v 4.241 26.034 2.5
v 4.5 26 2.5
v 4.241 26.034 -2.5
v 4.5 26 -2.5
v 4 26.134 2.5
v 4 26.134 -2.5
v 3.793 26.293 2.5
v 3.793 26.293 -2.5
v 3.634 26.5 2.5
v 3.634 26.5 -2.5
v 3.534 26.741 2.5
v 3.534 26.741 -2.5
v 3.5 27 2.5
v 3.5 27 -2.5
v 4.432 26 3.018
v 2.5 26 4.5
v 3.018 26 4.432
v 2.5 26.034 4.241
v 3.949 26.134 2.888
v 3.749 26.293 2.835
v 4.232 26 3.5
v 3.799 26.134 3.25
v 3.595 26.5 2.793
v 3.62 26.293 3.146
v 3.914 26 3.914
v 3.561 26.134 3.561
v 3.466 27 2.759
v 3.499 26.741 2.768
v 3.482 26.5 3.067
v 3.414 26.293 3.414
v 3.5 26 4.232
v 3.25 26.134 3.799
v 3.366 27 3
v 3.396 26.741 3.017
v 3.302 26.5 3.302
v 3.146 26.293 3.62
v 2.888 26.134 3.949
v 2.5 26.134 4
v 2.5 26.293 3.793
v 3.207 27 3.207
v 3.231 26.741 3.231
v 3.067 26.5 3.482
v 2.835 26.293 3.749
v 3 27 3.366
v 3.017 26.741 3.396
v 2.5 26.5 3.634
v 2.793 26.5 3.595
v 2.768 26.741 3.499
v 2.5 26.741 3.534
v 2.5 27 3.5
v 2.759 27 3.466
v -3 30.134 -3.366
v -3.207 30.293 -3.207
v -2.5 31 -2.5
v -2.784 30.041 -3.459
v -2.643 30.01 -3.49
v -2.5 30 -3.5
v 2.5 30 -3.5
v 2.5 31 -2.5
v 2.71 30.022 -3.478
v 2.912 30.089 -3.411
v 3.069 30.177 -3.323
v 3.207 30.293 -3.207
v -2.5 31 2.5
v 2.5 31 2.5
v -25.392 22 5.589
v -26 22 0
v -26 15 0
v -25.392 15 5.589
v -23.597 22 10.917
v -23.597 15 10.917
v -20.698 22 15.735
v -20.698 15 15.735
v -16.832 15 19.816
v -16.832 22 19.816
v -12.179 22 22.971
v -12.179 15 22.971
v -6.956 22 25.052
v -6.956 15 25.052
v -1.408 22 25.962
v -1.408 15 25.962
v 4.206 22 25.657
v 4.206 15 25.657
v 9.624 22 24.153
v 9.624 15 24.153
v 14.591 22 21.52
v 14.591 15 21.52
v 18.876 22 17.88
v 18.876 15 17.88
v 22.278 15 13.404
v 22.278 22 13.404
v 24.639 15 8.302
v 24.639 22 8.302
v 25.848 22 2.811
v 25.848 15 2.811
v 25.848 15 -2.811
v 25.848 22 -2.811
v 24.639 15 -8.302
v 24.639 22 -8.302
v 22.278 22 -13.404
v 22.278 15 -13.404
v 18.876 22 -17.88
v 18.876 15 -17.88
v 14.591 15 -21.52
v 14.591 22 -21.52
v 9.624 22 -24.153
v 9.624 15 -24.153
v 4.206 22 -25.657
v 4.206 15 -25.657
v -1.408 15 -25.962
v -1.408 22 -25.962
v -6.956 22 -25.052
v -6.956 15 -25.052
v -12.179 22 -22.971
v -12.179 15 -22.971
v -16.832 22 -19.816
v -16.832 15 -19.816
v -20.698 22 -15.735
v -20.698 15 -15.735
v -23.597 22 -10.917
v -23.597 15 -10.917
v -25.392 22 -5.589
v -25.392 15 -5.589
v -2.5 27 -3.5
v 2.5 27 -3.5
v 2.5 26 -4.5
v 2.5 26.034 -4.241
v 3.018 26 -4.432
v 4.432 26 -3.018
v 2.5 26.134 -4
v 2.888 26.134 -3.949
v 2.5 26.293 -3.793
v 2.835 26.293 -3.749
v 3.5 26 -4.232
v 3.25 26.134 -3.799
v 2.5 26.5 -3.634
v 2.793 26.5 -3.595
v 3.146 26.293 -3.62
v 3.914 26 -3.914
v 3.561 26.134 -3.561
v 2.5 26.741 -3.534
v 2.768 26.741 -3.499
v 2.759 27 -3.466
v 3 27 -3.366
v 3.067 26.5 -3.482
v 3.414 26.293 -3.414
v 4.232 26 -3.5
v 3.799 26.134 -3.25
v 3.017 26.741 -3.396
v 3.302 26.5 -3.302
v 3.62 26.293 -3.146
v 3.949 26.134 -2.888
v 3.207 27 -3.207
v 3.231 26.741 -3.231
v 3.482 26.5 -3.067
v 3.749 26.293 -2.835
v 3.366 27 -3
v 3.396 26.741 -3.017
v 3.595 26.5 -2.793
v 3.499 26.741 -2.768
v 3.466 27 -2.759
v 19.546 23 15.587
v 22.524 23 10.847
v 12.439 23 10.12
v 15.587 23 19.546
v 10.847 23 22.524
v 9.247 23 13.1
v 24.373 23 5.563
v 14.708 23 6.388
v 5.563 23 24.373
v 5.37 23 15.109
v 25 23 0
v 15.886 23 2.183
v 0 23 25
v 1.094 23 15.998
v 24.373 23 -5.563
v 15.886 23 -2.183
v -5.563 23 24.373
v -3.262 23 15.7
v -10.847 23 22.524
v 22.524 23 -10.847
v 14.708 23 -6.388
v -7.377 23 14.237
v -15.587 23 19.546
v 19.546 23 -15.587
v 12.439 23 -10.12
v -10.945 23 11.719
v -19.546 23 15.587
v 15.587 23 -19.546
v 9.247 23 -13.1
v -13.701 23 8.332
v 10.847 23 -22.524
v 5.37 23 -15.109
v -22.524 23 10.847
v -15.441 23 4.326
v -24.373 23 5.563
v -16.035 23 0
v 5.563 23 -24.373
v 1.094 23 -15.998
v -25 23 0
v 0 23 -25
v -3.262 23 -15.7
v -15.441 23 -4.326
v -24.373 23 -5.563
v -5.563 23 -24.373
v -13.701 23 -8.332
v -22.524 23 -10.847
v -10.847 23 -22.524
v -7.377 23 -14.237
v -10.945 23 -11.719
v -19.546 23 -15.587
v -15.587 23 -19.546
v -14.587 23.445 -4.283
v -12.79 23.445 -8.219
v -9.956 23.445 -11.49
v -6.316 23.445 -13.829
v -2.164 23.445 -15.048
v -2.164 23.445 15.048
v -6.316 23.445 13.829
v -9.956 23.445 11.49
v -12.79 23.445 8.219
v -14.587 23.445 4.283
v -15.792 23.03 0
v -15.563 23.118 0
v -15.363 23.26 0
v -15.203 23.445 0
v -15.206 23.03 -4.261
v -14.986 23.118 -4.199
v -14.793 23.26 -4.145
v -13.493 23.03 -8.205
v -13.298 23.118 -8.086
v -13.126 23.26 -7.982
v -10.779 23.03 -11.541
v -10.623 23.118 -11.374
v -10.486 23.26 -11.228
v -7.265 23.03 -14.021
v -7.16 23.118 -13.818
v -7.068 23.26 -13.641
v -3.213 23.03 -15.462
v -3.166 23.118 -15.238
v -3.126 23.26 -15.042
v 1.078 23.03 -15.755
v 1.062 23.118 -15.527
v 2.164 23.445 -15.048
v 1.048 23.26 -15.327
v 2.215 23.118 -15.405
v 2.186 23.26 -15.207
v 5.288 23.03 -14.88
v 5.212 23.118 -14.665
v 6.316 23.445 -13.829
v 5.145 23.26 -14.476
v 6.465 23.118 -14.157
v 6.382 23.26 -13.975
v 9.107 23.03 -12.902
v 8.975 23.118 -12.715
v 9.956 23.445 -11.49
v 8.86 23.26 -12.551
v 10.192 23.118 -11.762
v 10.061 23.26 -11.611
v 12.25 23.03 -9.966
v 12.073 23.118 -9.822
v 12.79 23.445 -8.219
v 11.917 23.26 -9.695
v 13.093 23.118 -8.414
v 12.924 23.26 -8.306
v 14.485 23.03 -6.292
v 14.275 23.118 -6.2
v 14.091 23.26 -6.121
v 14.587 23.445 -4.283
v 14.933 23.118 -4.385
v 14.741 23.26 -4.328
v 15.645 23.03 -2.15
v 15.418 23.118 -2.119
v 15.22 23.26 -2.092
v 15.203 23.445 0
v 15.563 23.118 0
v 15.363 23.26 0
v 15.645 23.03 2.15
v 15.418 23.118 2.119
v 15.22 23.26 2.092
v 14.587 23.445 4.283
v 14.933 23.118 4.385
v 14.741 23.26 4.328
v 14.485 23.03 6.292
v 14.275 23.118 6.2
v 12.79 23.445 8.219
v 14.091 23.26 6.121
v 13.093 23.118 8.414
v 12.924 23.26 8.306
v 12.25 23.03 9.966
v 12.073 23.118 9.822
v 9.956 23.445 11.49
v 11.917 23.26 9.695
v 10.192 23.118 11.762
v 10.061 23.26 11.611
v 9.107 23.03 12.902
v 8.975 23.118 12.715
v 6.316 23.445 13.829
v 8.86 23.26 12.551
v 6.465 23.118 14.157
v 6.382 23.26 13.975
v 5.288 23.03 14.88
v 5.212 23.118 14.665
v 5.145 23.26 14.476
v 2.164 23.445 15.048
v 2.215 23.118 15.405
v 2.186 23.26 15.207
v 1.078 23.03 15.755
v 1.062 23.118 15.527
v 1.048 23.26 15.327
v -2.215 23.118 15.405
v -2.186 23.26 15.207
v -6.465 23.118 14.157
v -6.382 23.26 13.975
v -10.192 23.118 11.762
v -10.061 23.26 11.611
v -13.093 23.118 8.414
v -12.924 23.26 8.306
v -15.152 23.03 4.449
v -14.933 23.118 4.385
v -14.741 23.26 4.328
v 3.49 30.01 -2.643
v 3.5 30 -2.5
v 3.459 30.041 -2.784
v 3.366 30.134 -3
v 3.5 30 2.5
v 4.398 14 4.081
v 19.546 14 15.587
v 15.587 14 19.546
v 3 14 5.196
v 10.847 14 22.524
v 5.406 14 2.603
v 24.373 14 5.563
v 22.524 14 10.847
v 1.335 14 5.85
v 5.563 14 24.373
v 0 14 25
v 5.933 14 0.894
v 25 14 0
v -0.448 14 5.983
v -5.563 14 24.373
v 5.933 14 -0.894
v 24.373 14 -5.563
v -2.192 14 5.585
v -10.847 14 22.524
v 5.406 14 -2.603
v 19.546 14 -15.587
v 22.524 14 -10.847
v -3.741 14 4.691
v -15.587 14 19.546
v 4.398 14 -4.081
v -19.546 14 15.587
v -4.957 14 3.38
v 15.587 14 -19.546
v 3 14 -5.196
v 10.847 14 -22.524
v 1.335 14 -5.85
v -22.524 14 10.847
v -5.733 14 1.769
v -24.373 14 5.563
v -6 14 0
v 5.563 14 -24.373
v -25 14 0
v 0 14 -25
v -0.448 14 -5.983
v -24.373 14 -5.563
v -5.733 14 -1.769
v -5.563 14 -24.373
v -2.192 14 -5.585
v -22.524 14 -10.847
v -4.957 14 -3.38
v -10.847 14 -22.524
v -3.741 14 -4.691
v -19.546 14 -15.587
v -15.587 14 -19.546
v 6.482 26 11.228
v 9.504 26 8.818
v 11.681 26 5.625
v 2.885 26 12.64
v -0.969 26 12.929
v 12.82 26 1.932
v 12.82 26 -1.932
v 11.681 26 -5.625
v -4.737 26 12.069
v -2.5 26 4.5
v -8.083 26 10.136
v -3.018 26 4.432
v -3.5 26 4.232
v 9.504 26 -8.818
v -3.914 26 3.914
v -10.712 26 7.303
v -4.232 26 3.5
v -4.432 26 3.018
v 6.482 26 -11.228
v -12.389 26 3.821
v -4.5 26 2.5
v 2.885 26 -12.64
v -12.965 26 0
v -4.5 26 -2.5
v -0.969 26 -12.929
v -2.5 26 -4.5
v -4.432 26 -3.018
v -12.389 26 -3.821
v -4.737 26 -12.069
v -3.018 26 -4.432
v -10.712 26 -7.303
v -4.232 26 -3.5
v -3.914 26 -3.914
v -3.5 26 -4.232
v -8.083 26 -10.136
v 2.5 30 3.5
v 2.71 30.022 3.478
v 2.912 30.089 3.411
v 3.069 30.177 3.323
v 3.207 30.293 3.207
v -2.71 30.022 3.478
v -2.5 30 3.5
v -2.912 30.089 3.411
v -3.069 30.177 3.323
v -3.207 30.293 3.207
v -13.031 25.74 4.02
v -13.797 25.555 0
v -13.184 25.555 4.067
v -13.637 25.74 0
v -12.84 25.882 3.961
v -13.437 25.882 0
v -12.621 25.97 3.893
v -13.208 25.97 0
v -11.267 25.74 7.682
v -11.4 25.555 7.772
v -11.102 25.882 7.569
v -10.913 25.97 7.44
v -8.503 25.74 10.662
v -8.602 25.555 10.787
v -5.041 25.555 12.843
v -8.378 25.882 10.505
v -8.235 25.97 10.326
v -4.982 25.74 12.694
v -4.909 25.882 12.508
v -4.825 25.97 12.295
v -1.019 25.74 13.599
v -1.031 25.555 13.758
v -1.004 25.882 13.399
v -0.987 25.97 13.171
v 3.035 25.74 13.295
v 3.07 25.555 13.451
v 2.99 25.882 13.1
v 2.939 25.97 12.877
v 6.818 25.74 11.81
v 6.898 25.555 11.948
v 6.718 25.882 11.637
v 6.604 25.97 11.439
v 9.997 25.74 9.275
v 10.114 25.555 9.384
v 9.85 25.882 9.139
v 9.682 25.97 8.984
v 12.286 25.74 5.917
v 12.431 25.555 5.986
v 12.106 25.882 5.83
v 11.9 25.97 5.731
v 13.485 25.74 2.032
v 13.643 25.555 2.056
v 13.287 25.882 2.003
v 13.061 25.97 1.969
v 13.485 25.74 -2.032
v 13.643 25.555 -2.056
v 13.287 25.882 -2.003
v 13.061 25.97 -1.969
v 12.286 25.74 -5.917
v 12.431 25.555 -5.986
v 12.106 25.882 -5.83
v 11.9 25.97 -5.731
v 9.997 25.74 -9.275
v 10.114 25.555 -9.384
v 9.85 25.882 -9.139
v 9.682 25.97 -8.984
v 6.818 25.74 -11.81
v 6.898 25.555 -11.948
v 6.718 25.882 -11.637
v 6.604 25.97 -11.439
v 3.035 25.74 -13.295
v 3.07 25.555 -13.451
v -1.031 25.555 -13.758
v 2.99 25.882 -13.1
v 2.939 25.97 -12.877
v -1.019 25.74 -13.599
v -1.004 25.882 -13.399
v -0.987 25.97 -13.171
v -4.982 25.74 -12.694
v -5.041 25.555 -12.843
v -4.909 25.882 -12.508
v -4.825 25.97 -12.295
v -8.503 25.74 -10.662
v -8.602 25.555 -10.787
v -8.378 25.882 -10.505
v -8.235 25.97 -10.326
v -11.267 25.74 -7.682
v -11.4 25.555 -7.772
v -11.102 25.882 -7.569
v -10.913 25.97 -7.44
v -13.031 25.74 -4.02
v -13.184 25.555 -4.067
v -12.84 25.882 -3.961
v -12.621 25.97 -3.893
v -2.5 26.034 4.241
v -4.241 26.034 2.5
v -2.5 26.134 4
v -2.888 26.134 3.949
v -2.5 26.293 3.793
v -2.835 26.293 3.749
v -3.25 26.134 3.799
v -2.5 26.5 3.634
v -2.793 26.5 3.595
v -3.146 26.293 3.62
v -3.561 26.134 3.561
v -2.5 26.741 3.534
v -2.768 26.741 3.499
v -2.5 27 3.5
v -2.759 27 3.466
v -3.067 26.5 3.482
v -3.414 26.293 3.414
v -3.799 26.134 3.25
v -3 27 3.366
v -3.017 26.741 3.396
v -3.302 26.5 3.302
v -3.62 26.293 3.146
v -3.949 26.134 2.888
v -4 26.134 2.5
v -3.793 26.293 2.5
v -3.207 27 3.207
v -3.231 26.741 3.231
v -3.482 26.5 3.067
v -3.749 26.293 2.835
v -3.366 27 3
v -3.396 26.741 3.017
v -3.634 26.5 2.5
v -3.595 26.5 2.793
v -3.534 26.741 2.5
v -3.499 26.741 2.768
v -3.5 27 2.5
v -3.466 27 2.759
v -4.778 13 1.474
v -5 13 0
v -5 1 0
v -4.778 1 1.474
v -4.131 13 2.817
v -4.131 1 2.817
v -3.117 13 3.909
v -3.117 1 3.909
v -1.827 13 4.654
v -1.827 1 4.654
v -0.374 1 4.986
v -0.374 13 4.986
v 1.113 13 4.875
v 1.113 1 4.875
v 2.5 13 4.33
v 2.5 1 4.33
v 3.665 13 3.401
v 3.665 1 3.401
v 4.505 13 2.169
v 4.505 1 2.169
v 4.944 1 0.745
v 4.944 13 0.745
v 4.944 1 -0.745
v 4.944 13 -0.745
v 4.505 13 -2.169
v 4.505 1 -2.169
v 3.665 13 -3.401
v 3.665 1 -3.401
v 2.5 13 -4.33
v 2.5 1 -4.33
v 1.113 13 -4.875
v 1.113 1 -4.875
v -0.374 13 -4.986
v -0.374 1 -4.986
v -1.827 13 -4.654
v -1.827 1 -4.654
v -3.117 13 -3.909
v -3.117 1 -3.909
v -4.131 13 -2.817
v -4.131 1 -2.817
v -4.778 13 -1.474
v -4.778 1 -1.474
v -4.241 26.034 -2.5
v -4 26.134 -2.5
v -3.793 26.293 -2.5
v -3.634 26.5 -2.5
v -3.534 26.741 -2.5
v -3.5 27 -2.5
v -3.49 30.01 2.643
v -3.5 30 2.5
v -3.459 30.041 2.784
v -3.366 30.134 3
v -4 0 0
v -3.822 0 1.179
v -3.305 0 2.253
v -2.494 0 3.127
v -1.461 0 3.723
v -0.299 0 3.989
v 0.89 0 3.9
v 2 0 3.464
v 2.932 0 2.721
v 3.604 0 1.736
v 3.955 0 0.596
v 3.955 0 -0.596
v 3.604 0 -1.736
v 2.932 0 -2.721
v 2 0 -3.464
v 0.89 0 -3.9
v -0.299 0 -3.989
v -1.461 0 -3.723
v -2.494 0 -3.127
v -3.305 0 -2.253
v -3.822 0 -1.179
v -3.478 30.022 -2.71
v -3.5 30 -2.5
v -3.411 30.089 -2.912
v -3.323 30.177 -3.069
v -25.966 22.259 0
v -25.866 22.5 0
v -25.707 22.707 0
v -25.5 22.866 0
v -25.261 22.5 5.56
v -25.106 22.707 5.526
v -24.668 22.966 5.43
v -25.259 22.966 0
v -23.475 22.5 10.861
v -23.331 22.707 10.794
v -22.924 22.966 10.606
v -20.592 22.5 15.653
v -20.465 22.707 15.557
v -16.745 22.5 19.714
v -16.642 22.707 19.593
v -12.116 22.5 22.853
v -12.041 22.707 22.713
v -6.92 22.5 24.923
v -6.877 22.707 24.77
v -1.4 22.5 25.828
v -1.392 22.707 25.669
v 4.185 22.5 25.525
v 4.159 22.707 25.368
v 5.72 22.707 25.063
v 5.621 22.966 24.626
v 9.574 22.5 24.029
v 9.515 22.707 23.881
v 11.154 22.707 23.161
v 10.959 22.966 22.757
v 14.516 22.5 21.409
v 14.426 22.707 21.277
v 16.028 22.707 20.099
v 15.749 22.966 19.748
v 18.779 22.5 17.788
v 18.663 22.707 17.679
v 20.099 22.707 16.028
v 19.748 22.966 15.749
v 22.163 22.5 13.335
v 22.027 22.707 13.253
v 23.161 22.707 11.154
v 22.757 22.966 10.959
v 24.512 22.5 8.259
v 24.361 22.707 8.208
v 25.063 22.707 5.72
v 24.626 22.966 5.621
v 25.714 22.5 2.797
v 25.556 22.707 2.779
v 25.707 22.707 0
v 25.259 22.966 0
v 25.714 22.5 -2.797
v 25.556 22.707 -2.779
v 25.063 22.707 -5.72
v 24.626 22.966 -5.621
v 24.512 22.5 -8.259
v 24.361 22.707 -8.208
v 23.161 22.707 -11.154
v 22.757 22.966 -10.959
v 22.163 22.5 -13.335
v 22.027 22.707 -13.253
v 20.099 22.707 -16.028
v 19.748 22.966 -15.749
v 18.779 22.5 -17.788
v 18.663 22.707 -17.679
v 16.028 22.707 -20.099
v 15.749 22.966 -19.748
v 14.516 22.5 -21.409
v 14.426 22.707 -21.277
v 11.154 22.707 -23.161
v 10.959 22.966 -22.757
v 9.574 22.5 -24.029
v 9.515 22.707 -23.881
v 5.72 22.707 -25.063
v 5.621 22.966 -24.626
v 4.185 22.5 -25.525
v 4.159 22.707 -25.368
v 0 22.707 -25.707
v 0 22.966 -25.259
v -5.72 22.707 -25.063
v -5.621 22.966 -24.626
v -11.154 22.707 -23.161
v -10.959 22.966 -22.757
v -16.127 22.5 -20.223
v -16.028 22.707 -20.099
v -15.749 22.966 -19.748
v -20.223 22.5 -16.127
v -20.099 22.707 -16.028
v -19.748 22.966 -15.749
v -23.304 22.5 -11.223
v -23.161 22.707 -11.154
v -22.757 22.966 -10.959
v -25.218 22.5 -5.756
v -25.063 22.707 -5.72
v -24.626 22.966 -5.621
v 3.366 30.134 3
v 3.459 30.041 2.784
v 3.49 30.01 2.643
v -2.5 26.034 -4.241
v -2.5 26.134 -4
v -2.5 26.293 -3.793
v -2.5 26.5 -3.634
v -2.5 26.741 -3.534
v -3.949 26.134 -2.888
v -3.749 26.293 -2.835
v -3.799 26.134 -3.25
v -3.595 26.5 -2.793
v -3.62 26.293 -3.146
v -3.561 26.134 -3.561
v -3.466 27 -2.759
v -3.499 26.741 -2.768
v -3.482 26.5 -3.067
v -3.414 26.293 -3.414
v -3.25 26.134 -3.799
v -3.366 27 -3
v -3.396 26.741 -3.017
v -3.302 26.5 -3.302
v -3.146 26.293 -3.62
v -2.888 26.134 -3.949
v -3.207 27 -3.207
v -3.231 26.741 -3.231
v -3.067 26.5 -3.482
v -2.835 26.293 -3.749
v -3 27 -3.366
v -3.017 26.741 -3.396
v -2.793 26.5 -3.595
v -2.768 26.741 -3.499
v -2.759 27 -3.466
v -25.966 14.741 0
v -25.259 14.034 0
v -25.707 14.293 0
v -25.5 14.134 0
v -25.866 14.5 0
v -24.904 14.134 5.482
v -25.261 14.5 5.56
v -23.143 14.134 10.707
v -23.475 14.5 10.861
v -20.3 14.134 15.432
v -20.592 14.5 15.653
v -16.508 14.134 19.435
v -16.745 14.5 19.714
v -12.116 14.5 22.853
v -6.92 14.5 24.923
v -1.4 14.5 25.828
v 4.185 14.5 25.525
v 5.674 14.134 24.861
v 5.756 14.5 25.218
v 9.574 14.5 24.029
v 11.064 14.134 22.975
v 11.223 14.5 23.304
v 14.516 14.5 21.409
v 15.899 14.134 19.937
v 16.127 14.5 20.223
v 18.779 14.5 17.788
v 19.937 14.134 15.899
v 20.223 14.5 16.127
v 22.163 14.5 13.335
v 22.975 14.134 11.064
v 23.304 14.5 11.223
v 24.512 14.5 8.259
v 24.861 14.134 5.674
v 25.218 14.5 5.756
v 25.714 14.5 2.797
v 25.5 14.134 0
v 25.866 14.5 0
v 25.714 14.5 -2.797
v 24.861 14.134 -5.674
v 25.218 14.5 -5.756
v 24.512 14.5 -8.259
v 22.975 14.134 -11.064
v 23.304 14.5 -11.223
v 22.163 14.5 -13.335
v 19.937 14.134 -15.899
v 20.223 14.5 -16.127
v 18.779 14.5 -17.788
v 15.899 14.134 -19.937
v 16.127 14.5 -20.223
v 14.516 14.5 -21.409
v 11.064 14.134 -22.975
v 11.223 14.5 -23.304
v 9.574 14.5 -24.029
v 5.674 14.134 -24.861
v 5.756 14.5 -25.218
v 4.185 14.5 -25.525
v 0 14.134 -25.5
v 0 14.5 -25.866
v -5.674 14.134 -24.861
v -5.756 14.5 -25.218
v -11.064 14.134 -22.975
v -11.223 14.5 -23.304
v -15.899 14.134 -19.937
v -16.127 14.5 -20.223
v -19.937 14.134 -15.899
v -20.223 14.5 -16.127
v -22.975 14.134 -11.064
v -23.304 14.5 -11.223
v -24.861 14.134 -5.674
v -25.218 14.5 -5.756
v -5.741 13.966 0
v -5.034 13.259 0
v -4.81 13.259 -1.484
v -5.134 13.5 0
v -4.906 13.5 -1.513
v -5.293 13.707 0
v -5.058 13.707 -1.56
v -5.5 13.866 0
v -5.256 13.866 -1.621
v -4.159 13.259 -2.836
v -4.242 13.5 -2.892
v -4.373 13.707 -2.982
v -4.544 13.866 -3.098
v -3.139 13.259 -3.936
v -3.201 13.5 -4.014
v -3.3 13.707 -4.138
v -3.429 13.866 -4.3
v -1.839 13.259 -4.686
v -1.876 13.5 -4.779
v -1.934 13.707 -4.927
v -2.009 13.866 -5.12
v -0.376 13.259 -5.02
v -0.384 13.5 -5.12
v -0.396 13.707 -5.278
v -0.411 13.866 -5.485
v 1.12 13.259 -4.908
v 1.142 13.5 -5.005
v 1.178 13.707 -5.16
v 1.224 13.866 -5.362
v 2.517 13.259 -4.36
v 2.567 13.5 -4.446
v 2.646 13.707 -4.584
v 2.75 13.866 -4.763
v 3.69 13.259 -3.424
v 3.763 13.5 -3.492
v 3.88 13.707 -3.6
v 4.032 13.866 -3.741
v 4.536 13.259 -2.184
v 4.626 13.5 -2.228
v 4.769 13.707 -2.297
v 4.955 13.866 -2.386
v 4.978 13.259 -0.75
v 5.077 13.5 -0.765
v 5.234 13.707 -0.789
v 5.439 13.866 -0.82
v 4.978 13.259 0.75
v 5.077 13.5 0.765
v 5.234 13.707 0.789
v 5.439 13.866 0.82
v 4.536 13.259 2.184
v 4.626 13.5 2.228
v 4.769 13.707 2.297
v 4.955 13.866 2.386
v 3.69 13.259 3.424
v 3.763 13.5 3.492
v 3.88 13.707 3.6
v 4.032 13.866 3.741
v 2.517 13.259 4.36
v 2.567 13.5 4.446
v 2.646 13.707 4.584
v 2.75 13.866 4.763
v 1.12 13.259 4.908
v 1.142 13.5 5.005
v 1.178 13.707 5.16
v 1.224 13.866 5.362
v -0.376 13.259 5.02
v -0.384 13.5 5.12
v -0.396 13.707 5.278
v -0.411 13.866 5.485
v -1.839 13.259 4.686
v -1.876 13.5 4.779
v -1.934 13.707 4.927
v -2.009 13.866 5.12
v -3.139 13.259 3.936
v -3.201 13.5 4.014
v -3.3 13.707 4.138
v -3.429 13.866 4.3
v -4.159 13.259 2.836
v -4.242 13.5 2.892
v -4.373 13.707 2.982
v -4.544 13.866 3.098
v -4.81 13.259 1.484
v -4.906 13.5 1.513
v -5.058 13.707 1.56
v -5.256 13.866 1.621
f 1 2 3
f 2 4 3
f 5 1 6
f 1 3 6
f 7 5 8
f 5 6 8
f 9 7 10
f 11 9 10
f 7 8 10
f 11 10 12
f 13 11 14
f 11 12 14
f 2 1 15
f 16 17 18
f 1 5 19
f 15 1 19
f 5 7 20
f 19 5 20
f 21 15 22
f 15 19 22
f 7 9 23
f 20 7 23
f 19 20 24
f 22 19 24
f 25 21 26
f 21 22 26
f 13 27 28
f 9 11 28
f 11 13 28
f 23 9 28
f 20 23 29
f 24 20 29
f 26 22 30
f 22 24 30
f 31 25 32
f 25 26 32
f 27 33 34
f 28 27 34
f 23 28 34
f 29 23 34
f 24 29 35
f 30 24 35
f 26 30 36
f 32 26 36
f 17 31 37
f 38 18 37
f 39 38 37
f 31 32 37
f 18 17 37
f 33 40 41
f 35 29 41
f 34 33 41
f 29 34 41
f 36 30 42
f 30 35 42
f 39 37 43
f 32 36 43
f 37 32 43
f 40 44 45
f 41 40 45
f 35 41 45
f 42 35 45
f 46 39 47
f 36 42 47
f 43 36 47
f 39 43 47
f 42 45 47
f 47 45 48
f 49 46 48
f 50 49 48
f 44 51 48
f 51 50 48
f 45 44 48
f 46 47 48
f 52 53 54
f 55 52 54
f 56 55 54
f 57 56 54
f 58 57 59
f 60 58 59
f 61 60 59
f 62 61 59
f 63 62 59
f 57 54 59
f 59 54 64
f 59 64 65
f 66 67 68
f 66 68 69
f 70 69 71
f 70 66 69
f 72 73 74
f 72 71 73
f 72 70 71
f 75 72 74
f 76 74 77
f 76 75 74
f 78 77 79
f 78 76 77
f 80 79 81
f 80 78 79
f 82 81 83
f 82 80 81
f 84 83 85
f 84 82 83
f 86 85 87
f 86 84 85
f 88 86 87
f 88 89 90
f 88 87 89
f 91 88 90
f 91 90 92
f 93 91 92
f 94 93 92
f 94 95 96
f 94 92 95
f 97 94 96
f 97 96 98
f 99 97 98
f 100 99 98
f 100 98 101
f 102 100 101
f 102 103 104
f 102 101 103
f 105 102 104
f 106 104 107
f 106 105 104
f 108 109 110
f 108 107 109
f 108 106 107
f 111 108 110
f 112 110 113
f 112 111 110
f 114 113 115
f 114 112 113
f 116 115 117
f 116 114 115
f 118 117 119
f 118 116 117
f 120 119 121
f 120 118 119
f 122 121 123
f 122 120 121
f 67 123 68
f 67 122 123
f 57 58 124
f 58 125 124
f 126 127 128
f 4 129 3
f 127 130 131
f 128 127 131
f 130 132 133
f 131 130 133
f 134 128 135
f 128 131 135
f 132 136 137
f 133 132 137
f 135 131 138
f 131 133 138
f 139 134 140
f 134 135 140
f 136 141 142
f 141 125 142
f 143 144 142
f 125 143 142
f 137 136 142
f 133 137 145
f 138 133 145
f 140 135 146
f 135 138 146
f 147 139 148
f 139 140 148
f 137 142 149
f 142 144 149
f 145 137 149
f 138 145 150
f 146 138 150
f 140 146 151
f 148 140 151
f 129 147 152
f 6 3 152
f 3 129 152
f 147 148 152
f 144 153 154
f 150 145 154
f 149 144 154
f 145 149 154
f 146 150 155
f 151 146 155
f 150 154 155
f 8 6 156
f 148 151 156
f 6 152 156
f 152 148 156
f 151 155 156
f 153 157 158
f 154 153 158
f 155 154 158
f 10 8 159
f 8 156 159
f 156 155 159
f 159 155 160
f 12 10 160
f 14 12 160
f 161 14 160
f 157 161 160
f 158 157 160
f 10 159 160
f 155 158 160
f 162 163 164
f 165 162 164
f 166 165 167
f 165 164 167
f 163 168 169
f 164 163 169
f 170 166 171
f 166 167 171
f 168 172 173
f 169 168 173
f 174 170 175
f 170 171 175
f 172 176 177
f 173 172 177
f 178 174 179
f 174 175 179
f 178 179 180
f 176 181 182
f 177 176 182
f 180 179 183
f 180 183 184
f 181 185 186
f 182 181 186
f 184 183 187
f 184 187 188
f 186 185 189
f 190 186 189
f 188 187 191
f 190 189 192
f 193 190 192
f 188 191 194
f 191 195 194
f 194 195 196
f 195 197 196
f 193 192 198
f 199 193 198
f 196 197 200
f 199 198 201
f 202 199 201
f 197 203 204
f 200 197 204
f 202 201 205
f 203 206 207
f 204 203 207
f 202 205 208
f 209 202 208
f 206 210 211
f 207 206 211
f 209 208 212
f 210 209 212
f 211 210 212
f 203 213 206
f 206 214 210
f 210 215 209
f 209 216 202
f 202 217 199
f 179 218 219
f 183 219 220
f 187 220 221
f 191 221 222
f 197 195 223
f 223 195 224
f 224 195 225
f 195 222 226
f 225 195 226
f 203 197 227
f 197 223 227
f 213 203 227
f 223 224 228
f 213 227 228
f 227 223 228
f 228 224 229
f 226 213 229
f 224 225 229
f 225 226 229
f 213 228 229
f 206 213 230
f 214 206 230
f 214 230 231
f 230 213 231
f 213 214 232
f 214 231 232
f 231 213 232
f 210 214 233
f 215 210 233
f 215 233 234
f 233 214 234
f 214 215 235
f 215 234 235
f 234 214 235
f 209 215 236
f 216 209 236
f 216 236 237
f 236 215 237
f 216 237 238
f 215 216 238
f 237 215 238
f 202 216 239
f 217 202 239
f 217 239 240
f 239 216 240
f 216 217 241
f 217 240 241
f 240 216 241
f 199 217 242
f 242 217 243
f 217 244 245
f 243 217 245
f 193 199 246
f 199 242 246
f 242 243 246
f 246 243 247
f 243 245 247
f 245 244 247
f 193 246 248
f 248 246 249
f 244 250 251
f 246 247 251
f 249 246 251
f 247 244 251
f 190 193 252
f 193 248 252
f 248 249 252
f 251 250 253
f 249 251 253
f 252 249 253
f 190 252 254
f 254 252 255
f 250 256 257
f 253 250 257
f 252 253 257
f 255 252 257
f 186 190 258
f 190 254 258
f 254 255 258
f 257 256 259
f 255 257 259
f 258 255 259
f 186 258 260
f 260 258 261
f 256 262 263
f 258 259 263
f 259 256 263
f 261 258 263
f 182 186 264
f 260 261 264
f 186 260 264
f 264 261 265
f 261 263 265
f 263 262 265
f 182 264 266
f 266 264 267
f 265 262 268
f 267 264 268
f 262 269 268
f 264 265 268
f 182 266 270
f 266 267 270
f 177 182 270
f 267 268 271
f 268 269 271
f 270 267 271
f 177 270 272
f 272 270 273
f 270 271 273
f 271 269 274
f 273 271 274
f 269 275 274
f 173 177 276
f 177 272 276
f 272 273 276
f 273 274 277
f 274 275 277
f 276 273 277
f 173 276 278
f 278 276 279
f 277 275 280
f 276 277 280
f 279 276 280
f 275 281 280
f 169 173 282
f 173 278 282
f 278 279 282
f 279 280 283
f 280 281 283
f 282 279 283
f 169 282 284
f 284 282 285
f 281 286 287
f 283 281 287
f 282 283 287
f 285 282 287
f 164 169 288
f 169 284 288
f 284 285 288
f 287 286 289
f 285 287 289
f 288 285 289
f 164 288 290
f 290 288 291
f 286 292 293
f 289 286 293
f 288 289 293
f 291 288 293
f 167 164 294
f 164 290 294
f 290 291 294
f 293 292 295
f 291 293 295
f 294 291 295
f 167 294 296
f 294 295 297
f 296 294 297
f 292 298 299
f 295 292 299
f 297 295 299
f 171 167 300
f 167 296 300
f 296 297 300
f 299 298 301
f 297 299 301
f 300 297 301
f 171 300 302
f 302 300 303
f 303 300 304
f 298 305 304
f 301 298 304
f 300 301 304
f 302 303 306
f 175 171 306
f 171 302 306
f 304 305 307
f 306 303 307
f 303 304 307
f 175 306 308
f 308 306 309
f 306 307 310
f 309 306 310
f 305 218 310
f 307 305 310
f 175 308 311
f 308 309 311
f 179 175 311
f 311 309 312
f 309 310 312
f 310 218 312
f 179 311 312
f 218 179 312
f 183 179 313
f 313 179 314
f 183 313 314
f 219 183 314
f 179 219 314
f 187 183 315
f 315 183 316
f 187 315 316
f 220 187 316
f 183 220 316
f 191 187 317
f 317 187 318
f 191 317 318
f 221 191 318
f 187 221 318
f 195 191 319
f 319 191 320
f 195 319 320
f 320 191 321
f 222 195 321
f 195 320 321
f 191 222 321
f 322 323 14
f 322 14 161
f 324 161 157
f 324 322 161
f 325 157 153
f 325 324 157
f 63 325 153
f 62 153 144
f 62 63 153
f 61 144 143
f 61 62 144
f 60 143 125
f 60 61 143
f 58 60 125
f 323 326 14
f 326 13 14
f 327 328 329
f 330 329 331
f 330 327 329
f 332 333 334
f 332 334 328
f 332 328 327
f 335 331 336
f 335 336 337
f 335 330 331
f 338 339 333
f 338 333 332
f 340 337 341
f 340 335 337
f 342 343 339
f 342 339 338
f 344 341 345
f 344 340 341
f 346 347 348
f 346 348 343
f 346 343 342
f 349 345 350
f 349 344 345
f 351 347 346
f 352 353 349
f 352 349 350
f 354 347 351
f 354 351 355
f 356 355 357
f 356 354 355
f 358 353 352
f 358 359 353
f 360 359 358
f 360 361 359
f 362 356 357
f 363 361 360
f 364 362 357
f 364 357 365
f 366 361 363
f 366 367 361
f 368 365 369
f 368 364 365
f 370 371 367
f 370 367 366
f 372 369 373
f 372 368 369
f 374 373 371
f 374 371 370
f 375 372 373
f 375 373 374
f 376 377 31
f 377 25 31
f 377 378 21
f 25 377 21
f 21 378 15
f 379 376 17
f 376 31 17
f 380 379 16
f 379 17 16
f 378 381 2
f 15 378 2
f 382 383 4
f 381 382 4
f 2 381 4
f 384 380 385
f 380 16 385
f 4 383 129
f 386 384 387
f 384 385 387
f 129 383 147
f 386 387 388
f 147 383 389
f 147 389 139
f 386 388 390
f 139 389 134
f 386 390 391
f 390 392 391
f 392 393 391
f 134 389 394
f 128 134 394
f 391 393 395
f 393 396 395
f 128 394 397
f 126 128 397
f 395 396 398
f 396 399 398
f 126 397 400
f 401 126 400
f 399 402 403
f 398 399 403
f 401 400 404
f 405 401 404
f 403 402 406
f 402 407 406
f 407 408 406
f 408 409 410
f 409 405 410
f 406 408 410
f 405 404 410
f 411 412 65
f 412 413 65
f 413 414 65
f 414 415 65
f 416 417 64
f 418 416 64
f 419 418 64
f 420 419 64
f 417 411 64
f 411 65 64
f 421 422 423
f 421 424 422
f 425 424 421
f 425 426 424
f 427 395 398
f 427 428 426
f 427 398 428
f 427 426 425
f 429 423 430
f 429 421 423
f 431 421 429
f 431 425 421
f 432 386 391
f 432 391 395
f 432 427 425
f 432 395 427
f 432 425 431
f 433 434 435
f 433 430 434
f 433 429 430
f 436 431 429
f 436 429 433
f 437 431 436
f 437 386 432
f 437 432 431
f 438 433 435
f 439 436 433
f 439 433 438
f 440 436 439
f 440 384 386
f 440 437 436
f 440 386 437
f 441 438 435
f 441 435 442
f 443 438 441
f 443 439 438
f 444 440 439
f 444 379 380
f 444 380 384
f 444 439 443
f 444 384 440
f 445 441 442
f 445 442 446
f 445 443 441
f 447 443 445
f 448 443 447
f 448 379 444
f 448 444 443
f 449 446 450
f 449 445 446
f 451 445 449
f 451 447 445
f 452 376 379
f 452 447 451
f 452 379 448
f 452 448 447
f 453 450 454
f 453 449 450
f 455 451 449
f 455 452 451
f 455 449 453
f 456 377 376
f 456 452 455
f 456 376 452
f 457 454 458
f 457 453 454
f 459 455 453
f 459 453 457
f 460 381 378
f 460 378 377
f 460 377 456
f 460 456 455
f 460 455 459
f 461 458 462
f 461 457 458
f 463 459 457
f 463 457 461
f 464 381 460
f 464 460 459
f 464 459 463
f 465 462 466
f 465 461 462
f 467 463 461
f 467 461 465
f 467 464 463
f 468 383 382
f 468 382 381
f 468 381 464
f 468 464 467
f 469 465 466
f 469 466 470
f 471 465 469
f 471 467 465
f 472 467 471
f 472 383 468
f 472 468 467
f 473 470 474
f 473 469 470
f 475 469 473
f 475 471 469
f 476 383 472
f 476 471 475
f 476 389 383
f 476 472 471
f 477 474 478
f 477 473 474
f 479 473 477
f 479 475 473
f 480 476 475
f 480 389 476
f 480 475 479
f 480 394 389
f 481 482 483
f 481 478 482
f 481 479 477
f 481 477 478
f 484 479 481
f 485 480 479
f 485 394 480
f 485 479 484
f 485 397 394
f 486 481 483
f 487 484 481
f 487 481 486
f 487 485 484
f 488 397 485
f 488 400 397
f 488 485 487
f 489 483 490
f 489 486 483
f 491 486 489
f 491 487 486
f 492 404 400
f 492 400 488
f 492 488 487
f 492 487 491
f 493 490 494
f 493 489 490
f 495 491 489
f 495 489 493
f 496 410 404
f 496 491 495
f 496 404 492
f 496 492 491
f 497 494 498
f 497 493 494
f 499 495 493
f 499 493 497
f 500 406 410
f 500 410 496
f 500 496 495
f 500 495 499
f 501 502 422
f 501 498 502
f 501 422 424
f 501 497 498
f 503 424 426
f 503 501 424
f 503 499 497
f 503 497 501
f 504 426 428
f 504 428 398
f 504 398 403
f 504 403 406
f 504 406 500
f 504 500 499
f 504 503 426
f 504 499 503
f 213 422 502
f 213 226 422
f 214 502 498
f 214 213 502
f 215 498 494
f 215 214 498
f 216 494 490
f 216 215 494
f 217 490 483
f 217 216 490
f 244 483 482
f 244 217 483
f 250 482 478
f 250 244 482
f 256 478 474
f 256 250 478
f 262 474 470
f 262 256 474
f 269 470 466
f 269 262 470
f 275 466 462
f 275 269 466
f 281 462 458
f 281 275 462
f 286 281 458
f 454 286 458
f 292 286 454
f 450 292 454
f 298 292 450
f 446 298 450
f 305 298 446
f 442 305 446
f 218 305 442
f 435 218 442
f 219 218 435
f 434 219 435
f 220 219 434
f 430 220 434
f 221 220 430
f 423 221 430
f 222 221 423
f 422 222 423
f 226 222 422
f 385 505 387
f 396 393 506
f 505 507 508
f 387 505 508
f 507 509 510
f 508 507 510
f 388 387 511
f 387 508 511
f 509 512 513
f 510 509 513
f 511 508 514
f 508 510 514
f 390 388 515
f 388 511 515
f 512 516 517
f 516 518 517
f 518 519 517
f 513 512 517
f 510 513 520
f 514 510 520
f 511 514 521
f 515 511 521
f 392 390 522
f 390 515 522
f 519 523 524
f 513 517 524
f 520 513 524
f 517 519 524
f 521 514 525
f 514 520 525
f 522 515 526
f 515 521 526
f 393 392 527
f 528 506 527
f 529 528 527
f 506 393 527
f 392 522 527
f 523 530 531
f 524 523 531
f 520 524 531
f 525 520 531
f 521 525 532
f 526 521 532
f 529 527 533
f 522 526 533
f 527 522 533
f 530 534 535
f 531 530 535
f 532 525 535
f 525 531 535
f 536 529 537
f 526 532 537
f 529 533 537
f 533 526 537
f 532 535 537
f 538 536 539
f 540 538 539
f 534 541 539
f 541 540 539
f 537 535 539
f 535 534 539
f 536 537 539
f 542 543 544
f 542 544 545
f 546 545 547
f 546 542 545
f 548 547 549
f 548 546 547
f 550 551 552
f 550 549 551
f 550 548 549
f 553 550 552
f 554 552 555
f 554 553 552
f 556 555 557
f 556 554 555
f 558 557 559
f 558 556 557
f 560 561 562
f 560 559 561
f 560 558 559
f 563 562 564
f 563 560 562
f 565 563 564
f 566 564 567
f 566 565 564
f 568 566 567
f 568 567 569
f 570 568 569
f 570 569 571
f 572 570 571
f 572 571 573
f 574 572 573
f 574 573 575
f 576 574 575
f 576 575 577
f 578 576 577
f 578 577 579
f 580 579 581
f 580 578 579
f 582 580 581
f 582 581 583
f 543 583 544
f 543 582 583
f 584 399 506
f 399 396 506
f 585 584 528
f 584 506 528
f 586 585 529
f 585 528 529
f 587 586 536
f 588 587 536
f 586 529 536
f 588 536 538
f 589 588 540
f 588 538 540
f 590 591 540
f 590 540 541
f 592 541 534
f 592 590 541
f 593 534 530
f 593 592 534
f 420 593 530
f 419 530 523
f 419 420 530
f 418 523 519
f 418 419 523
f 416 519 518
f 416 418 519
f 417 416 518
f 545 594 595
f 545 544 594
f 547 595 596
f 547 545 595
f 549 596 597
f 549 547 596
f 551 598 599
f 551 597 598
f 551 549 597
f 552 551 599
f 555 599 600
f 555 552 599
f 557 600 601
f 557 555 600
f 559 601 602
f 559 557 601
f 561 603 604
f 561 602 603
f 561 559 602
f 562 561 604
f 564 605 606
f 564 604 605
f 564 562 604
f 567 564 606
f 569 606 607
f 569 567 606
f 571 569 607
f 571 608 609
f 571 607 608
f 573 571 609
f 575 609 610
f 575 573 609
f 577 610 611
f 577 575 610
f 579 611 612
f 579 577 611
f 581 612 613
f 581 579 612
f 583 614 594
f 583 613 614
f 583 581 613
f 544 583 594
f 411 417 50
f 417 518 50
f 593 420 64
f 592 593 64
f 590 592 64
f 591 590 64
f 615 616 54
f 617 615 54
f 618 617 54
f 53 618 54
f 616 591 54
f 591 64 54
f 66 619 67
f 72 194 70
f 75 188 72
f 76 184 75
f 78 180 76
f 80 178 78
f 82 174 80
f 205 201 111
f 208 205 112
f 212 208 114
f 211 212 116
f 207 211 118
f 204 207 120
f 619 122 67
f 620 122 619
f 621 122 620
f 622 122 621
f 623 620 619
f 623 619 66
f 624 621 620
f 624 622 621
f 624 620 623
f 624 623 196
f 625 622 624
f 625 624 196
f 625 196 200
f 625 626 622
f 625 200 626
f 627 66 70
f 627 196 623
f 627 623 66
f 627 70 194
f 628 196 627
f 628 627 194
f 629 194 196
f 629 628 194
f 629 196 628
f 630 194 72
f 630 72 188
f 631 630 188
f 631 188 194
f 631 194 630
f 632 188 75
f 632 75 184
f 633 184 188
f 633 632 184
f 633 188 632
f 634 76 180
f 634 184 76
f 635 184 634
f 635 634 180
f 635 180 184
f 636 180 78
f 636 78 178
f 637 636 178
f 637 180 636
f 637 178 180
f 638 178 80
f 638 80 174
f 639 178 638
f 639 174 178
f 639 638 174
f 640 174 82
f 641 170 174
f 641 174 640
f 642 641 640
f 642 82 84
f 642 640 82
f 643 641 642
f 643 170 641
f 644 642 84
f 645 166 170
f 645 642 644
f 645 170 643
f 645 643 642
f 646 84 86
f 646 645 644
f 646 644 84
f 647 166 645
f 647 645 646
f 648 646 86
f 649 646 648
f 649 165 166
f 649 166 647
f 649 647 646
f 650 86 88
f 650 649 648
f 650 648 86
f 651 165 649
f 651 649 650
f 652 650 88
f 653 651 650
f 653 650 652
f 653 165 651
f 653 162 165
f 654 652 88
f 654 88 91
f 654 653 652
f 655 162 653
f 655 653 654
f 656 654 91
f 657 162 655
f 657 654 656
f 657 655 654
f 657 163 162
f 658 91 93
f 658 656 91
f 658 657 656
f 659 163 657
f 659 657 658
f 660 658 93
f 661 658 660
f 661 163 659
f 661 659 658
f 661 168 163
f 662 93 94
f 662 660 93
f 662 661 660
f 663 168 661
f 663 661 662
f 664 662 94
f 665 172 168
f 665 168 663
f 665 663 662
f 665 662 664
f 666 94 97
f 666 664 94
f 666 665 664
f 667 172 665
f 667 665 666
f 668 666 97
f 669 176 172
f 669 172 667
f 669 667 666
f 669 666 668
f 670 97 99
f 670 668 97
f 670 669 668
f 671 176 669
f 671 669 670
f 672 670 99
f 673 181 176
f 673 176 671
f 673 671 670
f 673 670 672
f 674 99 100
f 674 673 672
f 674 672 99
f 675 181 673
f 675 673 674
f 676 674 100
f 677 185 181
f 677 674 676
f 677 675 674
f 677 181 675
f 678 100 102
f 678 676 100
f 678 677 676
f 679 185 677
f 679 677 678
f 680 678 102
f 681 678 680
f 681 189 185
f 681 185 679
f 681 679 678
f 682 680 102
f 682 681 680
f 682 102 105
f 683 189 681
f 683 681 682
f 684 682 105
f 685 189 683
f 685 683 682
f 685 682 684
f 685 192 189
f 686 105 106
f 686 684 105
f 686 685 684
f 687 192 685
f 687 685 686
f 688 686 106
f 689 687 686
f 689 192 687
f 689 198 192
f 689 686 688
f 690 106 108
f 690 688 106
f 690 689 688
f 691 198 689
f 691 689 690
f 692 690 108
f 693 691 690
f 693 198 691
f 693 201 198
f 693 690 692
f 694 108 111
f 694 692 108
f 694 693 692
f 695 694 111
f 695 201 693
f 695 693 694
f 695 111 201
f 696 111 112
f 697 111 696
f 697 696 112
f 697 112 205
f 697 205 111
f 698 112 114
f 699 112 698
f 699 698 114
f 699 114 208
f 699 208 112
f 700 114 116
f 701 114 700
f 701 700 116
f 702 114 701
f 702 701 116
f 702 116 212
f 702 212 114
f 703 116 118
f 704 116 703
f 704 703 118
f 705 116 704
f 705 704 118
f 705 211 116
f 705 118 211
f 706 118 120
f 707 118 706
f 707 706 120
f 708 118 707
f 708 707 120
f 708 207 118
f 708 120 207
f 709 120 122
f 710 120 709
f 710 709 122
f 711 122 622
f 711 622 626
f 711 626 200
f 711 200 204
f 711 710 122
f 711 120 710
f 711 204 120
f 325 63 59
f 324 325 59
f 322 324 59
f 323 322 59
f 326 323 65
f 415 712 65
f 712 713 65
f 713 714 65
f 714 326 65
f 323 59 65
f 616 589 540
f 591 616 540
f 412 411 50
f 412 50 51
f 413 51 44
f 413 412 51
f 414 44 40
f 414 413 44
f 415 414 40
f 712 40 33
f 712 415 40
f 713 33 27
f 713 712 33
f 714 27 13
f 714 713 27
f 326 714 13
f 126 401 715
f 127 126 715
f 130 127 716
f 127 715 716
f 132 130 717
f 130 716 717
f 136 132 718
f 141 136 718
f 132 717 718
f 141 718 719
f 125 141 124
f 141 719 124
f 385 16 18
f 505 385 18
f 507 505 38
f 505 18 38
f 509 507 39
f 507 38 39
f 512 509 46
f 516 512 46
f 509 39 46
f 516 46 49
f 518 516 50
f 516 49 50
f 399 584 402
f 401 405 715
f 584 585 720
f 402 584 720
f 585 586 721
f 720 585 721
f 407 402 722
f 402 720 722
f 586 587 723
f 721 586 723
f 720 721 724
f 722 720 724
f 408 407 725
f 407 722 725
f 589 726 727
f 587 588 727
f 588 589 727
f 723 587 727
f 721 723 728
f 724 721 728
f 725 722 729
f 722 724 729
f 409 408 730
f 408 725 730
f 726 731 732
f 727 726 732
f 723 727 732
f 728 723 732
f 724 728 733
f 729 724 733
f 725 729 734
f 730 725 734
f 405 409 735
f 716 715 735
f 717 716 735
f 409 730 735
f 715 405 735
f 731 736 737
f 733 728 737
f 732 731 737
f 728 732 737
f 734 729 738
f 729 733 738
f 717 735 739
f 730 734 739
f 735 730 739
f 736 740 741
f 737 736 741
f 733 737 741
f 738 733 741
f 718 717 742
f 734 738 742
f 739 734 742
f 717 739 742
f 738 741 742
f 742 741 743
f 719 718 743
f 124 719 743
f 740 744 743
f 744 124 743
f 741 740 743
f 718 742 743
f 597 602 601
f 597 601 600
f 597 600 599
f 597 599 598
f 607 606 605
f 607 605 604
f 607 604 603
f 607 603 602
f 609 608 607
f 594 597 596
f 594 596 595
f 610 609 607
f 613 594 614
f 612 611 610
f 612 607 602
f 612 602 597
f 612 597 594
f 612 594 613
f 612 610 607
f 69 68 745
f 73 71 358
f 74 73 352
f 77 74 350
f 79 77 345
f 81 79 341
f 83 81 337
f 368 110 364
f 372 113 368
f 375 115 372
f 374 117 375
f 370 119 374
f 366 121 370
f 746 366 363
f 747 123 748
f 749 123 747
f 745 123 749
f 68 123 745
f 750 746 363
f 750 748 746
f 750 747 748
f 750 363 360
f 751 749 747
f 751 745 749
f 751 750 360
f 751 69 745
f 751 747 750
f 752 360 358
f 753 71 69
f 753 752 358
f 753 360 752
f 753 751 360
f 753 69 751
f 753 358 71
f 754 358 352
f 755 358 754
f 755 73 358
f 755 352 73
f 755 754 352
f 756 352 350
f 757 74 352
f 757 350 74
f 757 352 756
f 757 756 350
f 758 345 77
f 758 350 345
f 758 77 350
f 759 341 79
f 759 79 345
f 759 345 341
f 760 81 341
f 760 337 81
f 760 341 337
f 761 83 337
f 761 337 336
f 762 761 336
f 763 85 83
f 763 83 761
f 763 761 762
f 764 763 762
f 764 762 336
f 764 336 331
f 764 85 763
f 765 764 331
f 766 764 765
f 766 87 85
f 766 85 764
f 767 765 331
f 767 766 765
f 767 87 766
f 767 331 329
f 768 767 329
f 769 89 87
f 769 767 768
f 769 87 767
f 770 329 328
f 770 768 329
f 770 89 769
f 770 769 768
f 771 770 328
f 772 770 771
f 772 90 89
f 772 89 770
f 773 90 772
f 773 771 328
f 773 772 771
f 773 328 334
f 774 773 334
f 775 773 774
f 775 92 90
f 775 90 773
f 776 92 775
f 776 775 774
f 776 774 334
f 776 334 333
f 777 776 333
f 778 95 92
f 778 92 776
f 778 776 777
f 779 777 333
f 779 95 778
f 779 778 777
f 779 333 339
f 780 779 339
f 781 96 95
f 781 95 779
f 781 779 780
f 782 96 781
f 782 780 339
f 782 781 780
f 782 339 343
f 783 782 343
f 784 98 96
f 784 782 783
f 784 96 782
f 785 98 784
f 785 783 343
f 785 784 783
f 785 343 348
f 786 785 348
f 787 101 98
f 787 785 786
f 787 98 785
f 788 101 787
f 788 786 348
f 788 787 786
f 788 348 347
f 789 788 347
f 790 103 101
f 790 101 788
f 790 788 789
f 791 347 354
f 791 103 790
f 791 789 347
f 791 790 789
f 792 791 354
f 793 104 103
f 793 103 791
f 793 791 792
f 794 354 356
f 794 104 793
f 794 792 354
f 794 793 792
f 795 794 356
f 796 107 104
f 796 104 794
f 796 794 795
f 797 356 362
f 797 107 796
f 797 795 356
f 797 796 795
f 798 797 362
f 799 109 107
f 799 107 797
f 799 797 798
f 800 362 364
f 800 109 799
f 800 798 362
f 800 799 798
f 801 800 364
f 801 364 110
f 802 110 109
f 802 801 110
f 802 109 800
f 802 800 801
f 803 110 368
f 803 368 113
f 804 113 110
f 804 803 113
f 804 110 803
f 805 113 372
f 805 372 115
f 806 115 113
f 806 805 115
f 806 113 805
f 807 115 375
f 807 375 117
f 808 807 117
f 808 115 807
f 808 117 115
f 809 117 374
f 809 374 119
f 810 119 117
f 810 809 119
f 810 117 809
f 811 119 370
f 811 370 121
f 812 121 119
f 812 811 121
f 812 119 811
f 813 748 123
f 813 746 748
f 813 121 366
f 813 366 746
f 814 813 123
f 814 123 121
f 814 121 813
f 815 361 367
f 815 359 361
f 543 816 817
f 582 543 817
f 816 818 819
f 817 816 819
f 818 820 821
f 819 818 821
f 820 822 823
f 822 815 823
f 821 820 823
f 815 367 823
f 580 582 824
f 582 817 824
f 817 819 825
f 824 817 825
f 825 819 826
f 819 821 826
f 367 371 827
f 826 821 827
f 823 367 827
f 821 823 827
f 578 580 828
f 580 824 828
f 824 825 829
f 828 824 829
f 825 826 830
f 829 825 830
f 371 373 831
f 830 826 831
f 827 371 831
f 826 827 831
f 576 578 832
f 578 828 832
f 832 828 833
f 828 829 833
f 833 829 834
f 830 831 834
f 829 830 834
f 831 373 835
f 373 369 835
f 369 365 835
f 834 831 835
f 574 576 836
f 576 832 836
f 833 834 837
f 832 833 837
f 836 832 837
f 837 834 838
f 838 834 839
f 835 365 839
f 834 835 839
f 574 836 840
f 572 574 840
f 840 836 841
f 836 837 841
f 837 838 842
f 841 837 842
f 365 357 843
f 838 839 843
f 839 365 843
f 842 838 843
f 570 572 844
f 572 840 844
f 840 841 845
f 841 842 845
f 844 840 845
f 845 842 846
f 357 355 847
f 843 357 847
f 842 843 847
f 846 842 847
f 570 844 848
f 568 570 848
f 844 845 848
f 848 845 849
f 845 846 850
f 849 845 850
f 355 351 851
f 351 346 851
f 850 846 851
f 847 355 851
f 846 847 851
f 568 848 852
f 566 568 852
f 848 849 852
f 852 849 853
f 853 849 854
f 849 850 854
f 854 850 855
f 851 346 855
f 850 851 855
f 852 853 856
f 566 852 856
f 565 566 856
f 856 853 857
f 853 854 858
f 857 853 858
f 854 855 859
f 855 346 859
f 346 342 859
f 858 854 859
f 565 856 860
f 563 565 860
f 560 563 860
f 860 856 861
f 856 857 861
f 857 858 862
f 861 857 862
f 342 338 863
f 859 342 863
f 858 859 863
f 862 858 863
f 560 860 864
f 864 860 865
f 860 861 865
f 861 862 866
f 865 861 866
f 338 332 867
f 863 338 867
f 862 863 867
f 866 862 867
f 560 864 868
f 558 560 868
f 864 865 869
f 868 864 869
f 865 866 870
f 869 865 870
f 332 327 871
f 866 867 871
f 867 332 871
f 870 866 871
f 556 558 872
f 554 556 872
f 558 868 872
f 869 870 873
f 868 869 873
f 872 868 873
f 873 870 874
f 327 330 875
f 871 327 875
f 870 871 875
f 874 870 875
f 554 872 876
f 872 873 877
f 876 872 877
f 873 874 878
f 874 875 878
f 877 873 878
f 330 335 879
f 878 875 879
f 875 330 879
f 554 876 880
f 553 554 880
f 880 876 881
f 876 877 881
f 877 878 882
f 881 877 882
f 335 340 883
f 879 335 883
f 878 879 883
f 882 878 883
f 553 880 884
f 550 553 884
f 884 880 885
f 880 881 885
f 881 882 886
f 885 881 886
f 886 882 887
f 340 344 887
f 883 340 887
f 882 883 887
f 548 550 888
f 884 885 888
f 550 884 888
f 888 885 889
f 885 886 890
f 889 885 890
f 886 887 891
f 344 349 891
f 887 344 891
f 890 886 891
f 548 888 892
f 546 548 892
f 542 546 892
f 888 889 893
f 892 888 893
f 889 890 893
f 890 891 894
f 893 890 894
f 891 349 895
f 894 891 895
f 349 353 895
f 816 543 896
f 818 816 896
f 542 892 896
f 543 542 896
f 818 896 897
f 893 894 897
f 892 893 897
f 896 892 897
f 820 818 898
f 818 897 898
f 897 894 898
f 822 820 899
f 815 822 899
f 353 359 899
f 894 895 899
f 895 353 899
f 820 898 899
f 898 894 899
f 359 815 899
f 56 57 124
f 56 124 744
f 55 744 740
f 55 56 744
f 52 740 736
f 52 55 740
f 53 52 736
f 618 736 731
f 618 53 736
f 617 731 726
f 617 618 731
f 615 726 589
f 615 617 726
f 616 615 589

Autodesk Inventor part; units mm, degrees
ref_plane "YZ Plane" through (0, 0, 0) normal (1, 0, 0) x (0, 1, 0)
ref_plane "XZ Plane" through (0, 0, 0) normal (0, 1, 0) x (-1, 0, 0)
ref_plane "XY Plane" through (0, 0, 0) normal (0, 0, 1) x (1, 0, 0)
sketch "Sketch1" plane through (0, 0, 0) normal (0, 0, 1) x (1, 0, 0)
  line L0 (0, 0) -> (-5, 0)
  line L1 (-5, 0) -> (-5, 14)
  line L2 (-5, 14) -> (-26, 14)
  line L3 (-26, 14) -> (-26, 23)
  line L4 (-26, 23) -> (-15.5, 23)
  line L5 (-15.5, 23) -> (-13.5, 26)
  line L6 (-13.5, 26) -> (0, 26)
  line L7 (0, 26) -> (0, 0) construction
  line L8 (0, 26) -> (0, 0)
  dimension "d0" = 5
  dimension "d1" = 14
  dimension "d2" = 9
  dimension "d4" = 3
  dimension "d5" = 13.5
  dimension "d6" = 15.5
  dimension "d7" = 26
  dimension "d8" = 26
revolve "Revolution1" add sketch "Sketch1" angle 360 about axis through (0, 26, 0) along (0, -1, 0)
sketch "Sketch4" plane through (0, 26, 0) normal (0, 1, 0) x (1, 0, 0)
  line L0 (3.5, 3.5) -> (-3.5, 3.5)
  line L1 (-3.5, 3.5) -> (-3.5, -3.5)
  line L2 (-3.5, -3.5) -> (3.5, -3.5)
  line L3 (3.5, -3.5) -> (3.5, 3.5)
  line L4 (3.5, 3.5) -> (-3.5, -3.5) construction
  line L5 (-3.5, 3.5) -> (3.5, -3.5) construction
  point P0 (0, 0)
  dimension "d26" = 7
  dimension "d27" = 7
extrude "Extrusion1" add sketch "Sketch4" along normal blind 5
thread "Thread1" size "M10x1.5" class "6g" standard "ISO Metric profile" length 9
chamfer "Chamfer1" distance 1 angle 45 5 edges at (5, 0, 0) (3.5, 31, 0) (0, 31, 3.5) (-3.5, 31, 0) (0, 31, -3.5)
fillet "Fillet4" radius 1 13 edges at (13.5, 26, 0) (15.5, 23, 0) (26, 23, 0) (26, 14, 0) (5, 14, 0) (3.5, 28, -3.5) (3.5, 28, 3.5) (-3.5, 28, -3.5) (-3.5, 28, 3.5) (3.5, 26, 0) (0, 26, 3.5) (-3.5, 26, 0) (0, 26, -3.5)
sketch "Sketch5" plane through (0, 23, 0) normal (0, 1, 0) x (1, 0, 0)
  point P0 (0, 0)
equation "\"BendRadius\" = Thickness"
equation "\"BendReliefWidth\" = Thickness"
equation "\"BendReliefDepth\" = 0.5 * Thickness"
equation "\"CornerReliefSize\" = 4 * Thickness"
equation "\"MinimumRemnant\" = 2 * Thickness"
equation "\"TransitionRadius\" = BendRadius"
equation "\"JacobiRadiusSize\" = BendRadius"
equation "\"GapSize\" = Thickness"
equation "\"Thickness\" = 0.5"
properties part number "Disc"
